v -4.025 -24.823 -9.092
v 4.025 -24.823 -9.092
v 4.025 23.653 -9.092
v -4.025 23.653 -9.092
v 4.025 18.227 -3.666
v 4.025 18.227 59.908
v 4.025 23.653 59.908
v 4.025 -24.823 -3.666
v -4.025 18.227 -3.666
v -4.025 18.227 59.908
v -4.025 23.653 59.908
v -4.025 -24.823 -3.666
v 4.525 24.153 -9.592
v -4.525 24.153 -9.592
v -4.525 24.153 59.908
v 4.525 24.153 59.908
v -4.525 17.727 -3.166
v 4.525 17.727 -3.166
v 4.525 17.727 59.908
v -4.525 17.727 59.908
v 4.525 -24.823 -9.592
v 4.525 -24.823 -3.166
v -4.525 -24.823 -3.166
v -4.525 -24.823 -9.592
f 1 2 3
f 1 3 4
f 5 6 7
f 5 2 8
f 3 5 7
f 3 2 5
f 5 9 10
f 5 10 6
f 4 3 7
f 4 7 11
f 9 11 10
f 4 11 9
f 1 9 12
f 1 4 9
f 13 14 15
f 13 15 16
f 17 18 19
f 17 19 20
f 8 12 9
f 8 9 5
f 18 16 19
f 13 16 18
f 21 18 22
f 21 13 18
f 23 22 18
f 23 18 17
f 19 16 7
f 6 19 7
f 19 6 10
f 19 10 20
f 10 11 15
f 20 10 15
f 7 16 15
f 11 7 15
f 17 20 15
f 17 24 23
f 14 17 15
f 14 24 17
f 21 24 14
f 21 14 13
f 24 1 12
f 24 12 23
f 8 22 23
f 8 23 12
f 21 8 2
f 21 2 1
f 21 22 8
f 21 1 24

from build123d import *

# Parameters (mm, degrees)
SKETCH2_W   = 9.050402016
SKETCH2_H   = 6.425792272
SKETCH2_W_2 = 8.050402016
SKETCH2_H_2 = 5.425792272


with BuildPart() as part:
    # Sweep-Thin1: sweep along a path in Sketch1
    with BuildLine(Plane(origin=(0, 0, 0), x_dir=(0, 0, -1), z_dir=(1, 0, 0))) as sweep_thin1_path:
        Line((-59.908239877, 20.940148661), (6.379118135, 20.940148661))
        Line((6.379118135, 20.940148661), (6.379118135, -24.823090134))
    # Sketch2 → Sweep-Thin1 (sweep)
    with BuildSketch(Plane(origin=(0, 20.940148661, 59.908239877), x_dir=(-1, 0, 0), z_dir=(0, 0, -1))):
        Rectangle(SKETCH2_W, SKETCH2_H)
        Rectangle(SKETCH2_W_2, SKETCH2_H_2, mode=Mode.SUBTRACT)
    sweep(path=sweep_thin1_path.line, transition=Transition.RIGHT)


solid = part.part
